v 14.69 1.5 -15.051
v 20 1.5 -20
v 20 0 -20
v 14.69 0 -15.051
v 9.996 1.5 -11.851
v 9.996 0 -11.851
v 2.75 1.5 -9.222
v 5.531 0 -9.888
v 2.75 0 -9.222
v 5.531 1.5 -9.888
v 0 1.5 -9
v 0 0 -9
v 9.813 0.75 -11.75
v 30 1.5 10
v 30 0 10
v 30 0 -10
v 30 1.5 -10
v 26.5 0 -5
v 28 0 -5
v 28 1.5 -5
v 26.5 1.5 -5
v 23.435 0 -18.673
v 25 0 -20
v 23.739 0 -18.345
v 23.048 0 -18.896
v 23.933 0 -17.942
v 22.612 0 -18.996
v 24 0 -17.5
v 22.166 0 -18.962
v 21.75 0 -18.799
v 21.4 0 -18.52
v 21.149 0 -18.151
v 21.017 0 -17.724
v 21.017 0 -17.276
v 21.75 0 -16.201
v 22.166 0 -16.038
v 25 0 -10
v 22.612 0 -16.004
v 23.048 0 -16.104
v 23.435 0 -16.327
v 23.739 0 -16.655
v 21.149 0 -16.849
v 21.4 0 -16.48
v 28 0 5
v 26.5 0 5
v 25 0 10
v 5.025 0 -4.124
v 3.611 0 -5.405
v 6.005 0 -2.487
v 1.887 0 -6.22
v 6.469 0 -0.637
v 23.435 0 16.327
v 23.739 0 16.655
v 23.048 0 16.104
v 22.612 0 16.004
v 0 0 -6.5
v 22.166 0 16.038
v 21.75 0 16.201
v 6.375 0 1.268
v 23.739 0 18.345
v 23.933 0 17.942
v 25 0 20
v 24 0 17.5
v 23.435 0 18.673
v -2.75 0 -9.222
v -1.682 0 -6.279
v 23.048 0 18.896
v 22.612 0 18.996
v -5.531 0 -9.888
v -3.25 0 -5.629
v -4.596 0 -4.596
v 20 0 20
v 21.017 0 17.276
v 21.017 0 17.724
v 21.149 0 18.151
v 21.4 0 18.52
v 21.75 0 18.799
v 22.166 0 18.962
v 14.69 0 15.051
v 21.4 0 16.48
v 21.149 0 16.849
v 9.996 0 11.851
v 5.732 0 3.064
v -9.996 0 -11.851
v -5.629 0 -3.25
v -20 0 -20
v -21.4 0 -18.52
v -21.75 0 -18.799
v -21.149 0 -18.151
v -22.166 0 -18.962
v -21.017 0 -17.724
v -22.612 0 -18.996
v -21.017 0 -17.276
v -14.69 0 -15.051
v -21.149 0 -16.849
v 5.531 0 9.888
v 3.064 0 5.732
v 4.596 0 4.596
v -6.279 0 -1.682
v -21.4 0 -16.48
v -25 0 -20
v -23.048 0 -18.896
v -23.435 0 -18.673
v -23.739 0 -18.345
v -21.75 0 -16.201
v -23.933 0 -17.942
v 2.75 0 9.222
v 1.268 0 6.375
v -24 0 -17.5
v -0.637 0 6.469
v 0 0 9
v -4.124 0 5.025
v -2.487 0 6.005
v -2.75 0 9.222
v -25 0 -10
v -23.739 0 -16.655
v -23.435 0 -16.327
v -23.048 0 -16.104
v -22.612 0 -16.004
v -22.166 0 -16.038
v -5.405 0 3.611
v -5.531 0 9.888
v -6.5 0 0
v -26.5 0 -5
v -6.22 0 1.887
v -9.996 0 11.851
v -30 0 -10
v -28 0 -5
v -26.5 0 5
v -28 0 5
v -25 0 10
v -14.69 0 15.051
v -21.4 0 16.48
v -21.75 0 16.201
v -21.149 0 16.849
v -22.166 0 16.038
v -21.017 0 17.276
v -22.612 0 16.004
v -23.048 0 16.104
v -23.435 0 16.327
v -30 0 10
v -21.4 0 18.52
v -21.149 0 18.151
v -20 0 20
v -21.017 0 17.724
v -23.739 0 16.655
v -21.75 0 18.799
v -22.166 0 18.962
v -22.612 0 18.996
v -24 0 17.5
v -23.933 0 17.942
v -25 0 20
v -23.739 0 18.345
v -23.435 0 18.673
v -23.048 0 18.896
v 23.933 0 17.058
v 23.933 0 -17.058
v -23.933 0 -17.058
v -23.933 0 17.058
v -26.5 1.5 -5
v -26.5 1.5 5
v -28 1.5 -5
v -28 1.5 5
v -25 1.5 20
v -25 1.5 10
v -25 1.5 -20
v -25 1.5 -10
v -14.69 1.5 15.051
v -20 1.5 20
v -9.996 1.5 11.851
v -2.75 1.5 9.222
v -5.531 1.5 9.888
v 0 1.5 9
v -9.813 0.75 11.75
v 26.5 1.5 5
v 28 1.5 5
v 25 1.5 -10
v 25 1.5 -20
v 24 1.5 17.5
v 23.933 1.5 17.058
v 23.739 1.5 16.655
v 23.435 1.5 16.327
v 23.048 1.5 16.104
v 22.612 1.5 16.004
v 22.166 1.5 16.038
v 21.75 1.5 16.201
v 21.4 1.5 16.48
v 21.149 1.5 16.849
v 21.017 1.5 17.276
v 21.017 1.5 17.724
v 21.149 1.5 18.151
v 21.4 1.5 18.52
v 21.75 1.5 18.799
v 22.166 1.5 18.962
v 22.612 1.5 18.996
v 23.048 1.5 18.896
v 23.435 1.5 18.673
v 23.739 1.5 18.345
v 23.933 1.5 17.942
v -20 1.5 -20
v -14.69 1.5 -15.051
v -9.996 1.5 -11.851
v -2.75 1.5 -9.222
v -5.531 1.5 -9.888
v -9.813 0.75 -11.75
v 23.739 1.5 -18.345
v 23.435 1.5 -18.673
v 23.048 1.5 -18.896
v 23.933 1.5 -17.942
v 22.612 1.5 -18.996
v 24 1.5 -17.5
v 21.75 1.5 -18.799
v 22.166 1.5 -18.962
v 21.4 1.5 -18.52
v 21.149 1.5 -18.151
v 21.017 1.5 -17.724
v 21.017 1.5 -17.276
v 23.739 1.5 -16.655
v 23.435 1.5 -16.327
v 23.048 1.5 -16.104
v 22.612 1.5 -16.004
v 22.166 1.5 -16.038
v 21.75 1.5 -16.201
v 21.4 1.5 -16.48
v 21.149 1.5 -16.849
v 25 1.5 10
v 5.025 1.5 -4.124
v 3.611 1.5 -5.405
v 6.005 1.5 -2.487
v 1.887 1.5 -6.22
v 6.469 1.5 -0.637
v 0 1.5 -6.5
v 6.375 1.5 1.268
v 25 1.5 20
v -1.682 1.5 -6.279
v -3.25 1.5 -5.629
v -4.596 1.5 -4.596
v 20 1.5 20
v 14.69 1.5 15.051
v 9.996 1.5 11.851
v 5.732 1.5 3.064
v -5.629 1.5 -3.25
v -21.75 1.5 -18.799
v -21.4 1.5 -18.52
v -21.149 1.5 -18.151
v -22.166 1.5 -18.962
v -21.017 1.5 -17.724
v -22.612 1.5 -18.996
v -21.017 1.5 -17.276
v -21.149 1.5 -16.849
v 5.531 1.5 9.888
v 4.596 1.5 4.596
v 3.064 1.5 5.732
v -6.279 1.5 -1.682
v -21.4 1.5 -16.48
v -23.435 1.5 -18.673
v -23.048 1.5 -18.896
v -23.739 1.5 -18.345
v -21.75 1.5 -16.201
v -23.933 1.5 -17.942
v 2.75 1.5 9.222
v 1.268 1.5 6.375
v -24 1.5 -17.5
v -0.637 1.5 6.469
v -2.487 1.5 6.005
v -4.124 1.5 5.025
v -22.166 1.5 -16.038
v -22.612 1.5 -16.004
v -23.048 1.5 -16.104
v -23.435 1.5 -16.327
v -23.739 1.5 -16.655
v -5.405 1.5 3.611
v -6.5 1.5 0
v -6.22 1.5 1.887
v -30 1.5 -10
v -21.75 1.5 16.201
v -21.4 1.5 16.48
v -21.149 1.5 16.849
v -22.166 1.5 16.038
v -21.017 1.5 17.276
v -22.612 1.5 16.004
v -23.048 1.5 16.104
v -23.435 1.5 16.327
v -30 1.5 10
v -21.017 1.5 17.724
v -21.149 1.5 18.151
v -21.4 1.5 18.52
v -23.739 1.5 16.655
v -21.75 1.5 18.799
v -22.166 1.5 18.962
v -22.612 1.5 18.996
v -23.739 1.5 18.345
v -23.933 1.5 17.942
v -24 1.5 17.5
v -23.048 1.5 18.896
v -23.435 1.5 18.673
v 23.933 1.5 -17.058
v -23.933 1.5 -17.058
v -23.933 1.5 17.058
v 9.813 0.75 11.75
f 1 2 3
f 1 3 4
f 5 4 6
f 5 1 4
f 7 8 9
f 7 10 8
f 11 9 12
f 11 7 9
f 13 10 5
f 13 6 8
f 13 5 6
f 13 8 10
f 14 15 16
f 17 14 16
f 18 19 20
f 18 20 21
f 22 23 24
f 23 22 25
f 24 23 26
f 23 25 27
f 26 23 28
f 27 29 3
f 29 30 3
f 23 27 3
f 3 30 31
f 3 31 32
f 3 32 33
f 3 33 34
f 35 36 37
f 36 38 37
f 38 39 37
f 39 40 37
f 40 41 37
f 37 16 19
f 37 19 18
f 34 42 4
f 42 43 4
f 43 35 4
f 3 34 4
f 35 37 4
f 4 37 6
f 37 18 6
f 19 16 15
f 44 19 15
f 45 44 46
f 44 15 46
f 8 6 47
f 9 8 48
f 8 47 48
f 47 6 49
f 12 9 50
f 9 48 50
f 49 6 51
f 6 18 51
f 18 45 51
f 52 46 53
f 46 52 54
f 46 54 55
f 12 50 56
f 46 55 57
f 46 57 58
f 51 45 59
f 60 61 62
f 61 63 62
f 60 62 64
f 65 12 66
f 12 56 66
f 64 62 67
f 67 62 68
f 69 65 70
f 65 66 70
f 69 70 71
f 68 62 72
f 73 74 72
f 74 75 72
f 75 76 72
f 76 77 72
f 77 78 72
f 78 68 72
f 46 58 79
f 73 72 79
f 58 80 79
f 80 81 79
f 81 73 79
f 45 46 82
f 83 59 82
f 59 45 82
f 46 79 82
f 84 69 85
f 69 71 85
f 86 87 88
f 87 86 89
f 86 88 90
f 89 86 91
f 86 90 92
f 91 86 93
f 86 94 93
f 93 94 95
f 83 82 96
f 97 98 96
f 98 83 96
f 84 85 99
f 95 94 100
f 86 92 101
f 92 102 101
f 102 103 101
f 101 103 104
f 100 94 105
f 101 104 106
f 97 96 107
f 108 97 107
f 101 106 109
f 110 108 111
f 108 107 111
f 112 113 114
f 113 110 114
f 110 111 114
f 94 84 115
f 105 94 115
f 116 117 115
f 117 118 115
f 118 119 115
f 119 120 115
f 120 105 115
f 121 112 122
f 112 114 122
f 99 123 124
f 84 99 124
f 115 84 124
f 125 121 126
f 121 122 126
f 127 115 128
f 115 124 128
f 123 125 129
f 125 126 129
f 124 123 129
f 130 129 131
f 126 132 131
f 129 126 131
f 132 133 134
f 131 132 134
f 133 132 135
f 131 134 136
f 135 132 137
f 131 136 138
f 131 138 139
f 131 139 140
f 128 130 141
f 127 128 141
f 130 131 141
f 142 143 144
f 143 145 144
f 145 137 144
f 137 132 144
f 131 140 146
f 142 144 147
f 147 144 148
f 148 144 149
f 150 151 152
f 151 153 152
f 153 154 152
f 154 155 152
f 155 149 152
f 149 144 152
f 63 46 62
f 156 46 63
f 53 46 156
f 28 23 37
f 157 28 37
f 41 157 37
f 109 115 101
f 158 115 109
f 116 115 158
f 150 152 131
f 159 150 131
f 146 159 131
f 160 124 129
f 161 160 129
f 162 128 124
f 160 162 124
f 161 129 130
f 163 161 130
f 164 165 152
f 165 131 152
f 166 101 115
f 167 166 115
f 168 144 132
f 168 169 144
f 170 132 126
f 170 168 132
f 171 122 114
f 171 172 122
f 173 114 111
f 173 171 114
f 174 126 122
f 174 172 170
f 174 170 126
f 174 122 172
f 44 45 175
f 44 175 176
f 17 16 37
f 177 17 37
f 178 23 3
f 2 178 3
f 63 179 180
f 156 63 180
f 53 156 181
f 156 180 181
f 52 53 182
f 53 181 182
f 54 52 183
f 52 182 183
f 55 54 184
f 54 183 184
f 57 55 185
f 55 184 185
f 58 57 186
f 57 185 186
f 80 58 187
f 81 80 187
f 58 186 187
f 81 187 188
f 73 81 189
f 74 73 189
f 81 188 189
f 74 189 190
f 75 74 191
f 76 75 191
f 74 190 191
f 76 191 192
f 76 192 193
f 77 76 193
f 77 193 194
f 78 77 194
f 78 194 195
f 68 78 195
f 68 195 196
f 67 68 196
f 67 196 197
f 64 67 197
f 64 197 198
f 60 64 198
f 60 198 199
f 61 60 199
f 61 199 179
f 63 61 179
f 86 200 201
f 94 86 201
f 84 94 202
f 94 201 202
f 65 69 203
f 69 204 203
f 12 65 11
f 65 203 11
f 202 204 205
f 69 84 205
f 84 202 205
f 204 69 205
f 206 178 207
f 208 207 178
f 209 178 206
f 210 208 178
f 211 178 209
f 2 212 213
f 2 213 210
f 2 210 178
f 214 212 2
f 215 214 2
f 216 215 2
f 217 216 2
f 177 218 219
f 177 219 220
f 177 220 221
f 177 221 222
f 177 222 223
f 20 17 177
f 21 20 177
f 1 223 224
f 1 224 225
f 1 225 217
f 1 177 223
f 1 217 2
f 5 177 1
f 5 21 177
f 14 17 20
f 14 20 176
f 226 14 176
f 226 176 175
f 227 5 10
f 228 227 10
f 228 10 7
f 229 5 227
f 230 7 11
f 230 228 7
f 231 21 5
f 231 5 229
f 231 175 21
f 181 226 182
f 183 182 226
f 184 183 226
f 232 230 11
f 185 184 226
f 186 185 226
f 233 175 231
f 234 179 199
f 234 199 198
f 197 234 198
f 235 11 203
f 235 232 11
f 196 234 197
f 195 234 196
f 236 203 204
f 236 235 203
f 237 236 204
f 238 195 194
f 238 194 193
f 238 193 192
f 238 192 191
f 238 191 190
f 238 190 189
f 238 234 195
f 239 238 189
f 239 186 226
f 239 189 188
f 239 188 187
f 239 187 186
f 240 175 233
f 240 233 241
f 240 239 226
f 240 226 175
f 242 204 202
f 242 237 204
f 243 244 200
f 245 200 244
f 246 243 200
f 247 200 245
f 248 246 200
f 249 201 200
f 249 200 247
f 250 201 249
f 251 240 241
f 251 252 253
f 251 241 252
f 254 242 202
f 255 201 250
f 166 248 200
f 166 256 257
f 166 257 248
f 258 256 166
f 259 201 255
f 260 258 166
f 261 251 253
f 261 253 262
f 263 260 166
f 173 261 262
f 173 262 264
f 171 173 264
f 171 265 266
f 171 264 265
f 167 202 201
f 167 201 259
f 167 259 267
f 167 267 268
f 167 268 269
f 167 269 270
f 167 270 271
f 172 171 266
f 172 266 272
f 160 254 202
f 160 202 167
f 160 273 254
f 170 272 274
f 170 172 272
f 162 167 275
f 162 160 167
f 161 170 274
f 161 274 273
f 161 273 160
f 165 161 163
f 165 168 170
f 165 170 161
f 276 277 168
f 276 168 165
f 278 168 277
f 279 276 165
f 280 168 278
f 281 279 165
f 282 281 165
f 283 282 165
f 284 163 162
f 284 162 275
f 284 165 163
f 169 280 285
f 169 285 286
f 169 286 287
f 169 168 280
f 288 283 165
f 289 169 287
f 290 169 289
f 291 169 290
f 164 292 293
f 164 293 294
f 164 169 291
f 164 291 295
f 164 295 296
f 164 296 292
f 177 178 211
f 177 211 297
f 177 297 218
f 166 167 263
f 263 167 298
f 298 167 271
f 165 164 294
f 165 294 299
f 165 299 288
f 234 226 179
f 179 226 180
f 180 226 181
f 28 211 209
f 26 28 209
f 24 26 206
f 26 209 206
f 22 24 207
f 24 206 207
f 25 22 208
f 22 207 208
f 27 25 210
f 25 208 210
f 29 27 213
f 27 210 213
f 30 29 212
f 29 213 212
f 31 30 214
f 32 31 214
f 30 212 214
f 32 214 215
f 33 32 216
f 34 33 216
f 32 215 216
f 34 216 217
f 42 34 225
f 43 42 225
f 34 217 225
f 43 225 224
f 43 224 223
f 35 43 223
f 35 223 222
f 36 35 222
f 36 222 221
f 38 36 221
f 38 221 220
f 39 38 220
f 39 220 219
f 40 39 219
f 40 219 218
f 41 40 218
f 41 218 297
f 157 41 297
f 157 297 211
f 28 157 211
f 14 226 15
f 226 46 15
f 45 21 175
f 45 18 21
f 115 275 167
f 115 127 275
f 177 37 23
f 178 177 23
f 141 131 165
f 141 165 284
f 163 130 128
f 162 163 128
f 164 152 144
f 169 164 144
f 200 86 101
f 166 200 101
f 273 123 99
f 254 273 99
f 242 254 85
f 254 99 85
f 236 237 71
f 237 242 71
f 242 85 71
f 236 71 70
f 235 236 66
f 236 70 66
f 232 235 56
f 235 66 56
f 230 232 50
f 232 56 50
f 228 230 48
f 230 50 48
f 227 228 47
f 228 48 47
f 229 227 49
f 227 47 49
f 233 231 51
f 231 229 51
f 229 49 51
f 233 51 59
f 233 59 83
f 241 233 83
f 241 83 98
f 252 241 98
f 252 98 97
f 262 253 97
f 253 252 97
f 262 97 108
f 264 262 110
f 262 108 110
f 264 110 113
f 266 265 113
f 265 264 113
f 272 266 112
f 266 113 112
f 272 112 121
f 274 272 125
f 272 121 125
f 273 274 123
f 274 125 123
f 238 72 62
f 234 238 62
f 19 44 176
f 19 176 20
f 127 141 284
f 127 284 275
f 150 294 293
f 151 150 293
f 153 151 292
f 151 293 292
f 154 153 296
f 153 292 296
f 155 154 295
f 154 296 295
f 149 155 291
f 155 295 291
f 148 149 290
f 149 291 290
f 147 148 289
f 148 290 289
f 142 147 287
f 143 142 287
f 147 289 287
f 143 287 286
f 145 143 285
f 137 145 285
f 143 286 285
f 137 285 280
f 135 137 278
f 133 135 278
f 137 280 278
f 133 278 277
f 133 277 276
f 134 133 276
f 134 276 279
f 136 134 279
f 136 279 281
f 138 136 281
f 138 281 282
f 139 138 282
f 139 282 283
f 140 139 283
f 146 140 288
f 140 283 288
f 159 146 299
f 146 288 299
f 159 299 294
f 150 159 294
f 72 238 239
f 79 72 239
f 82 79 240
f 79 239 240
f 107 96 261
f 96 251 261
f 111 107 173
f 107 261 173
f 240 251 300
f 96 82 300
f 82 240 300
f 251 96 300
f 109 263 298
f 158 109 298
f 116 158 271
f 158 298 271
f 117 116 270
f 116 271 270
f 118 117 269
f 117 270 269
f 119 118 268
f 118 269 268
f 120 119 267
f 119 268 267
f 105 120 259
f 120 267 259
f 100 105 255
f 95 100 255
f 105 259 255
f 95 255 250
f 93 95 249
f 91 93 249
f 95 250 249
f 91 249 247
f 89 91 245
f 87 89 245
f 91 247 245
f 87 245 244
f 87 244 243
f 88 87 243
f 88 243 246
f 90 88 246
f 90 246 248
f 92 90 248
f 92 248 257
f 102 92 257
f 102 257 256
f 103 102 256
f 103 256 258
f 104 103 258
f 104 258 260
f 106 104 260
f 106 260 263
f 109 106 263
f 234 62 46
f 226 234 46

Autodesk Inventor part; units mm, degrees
ref_plane "YZ Plane" through (0, 0, 0) normal (1, 0, 0) x (0, 1, 0)
sketch "Sketch1" plane through (0, 0, 0) normal (0, 1, 0) x (-1, 0, 0)
  circle A0 centre (0, 0) radius 6.5
  line L0 (25, 20) -> (-25, 20)
  line L1 (-25, 20) -> (-25, -20)
  line L2 (-25, -20) -> (25, -20)
  line L3 (25, -20) -> (25, 20)
  line L4 (25, 20) -> (-25, -20) construction
  line L5 (-25, 20) -> (25, -20) construction
  line L6 (-25, 0) -> (-30, 0)
  line L7 (-30, 0) -> (-30, -10)
  line L8 (-30, -10) -> (-25, -10)
  line L9 (-25, -10) -> (-25, 0)
  line L10 (-30, 0) -> (-25, 0)
  line L11 (-25, 0) -> (-25, 10)
  line L12 (-25, 10) -> (-30, 10)
  line L13 (-30, 10) -> (-30, 0)
  line L14 (-25, 10) -> (-25, 5)
  line L15 (-25, 5) -> (-26.5, 5)
  line L16 (-26.5, 5) -> (-28, 5)
  line L17 (-28, 5) -> (-28, -5)
  line L18 (-28, -5) -> (-26.5, -5)
  line L19 (-26.5, -5) -> (-26.5, 5)
  line L20 (0, 0) -> (0, -20)
  line L21 (30, 0) -> (30, -10)
  line L22 (30, -10) -> (25, -10)
  line L23 (26.5, -5) -> (26.5, 5)
  line L24 (28, 5) -> (28, -5)
  line L25 (28, -5) -> (26.5, -5)
  line L26 (26.5, 5) -> (28, 5)
  line L27 (25, 10) -> (30, 10)
  line L28 (30, 10) -> (30, 0)
  dimension "d0" = 13
  dimension "d1" = 50
  dimension "d2" = 40
  dimension "d3" = 5
  dimension "d4" = 10
  dimension "d5" = 5
  dimension "d6" = 10
  dimension "d7" = 5
  dimension "d8" = 1.5
  dimension "d9" = 1.5
  dimension "d10" = 10
extrude "Extrusion1" add sketch "Sketch1" along normal blind 1.5 contours L2 L1 L0 L3 | L8 L7 L6 L17 L18 L19 L1 | L3 L27 L28 L21 L22 | L6 L19 L15 L1 | L15 L16 L17 L6 L13 L12 L1
sketch "Sketch2" plane through (0, 1.5, 0) normal (0, 1, 0) x (1, 0, 0)
  line L0 (0, 0) -> (22.5, 0)
  line L1 (22.5, 0) -> (22.5, 17.5)
  line L2 (25, 20) -> (-25, 20) projected
  circle A0 centre (22.5, 17.5) radius 1.5
  dimension "d13" = 22.5
  dimension "d14" = 17.5
  dimension "d15" = 3
extrude "Extrusion2" cut sketch "Sketch2" against normal blind 1.5
ref_plane "Work Plane1" through (0, 0, 20) normal (1, 0, 0) x (0, 0, -1)
ref_plane "Work Plane2" through (-25, 0, 0) normal (0, 0, 1) x (1, 0, 0)
mirror "Mirror1" about plane through (0, 0, 20) normal (1, 0, 0) of "Extrusion2"
mirror "Mirror2" about plane through (-25, 0, 0) normal (0, 0, 1) of "Extrusion2", "Mirror1"
sketch "Sketch3" plane through (0, 1.5, 0) normal (0, 1, 0) x (1, 0, 0)
  line L0 (25, 10) -> (25, 20) projected
  line L1 (25, 20) -> (20, 20)
  line L2 (25, 20) -> (-25, 20) projected
  line L3 (0, 0) -> (0, 9)
  line L4 (20, 20) -> (9.6256, 9) construction
  line L5 (9.6256, 9) -> (0, 9) construction
  spline S0 degree 2 poles (20, 20) (9.6256, 9) (0, 9) knots 1 1 1 2 2 2
  line L6 (0, 0) -> (9.6256, 0)
  line L7 (-20, 20) -> (-9.6256, 9) construction
  line L8 (-9.6256, 9) -> (0, 9) construction
  spline S1 degree 2 poles (-20, 20) (-9.6256, 9) (0, 9) knots 1 1 1 2 2 2
  line L9 (20, -20) -> (9.6256, -9) construction
  line L10 (9.6256, -9) -> (0, -9) construction
  spline S2 degree 2 poles (20, -20) (9.6256, -9) (0, -9) knots 1 1 1 2 2 2
  line L11 (-20, -20) -> (-9.6256, -9) construction
  spline S3 degree 2 poles (-20, -20) (-9.6256, -9) (0, -9) knots 1 1 1 2 2 2
  line L12 (-9.6256, -9) -> (0, -9) construction
  line L13 (20, 20) -> (-20, 20)
  line L14 (20, -20) -> (-20, -20)
  line L15 (-25, -20) -> (25, -20) projected
  dimension "d18" = 5
  dimension "d19" = 9
extrude "Extrusion3" cut sketch "Sketch3" against normal blind 1.5
properties part number "bottomBearingHolder"
